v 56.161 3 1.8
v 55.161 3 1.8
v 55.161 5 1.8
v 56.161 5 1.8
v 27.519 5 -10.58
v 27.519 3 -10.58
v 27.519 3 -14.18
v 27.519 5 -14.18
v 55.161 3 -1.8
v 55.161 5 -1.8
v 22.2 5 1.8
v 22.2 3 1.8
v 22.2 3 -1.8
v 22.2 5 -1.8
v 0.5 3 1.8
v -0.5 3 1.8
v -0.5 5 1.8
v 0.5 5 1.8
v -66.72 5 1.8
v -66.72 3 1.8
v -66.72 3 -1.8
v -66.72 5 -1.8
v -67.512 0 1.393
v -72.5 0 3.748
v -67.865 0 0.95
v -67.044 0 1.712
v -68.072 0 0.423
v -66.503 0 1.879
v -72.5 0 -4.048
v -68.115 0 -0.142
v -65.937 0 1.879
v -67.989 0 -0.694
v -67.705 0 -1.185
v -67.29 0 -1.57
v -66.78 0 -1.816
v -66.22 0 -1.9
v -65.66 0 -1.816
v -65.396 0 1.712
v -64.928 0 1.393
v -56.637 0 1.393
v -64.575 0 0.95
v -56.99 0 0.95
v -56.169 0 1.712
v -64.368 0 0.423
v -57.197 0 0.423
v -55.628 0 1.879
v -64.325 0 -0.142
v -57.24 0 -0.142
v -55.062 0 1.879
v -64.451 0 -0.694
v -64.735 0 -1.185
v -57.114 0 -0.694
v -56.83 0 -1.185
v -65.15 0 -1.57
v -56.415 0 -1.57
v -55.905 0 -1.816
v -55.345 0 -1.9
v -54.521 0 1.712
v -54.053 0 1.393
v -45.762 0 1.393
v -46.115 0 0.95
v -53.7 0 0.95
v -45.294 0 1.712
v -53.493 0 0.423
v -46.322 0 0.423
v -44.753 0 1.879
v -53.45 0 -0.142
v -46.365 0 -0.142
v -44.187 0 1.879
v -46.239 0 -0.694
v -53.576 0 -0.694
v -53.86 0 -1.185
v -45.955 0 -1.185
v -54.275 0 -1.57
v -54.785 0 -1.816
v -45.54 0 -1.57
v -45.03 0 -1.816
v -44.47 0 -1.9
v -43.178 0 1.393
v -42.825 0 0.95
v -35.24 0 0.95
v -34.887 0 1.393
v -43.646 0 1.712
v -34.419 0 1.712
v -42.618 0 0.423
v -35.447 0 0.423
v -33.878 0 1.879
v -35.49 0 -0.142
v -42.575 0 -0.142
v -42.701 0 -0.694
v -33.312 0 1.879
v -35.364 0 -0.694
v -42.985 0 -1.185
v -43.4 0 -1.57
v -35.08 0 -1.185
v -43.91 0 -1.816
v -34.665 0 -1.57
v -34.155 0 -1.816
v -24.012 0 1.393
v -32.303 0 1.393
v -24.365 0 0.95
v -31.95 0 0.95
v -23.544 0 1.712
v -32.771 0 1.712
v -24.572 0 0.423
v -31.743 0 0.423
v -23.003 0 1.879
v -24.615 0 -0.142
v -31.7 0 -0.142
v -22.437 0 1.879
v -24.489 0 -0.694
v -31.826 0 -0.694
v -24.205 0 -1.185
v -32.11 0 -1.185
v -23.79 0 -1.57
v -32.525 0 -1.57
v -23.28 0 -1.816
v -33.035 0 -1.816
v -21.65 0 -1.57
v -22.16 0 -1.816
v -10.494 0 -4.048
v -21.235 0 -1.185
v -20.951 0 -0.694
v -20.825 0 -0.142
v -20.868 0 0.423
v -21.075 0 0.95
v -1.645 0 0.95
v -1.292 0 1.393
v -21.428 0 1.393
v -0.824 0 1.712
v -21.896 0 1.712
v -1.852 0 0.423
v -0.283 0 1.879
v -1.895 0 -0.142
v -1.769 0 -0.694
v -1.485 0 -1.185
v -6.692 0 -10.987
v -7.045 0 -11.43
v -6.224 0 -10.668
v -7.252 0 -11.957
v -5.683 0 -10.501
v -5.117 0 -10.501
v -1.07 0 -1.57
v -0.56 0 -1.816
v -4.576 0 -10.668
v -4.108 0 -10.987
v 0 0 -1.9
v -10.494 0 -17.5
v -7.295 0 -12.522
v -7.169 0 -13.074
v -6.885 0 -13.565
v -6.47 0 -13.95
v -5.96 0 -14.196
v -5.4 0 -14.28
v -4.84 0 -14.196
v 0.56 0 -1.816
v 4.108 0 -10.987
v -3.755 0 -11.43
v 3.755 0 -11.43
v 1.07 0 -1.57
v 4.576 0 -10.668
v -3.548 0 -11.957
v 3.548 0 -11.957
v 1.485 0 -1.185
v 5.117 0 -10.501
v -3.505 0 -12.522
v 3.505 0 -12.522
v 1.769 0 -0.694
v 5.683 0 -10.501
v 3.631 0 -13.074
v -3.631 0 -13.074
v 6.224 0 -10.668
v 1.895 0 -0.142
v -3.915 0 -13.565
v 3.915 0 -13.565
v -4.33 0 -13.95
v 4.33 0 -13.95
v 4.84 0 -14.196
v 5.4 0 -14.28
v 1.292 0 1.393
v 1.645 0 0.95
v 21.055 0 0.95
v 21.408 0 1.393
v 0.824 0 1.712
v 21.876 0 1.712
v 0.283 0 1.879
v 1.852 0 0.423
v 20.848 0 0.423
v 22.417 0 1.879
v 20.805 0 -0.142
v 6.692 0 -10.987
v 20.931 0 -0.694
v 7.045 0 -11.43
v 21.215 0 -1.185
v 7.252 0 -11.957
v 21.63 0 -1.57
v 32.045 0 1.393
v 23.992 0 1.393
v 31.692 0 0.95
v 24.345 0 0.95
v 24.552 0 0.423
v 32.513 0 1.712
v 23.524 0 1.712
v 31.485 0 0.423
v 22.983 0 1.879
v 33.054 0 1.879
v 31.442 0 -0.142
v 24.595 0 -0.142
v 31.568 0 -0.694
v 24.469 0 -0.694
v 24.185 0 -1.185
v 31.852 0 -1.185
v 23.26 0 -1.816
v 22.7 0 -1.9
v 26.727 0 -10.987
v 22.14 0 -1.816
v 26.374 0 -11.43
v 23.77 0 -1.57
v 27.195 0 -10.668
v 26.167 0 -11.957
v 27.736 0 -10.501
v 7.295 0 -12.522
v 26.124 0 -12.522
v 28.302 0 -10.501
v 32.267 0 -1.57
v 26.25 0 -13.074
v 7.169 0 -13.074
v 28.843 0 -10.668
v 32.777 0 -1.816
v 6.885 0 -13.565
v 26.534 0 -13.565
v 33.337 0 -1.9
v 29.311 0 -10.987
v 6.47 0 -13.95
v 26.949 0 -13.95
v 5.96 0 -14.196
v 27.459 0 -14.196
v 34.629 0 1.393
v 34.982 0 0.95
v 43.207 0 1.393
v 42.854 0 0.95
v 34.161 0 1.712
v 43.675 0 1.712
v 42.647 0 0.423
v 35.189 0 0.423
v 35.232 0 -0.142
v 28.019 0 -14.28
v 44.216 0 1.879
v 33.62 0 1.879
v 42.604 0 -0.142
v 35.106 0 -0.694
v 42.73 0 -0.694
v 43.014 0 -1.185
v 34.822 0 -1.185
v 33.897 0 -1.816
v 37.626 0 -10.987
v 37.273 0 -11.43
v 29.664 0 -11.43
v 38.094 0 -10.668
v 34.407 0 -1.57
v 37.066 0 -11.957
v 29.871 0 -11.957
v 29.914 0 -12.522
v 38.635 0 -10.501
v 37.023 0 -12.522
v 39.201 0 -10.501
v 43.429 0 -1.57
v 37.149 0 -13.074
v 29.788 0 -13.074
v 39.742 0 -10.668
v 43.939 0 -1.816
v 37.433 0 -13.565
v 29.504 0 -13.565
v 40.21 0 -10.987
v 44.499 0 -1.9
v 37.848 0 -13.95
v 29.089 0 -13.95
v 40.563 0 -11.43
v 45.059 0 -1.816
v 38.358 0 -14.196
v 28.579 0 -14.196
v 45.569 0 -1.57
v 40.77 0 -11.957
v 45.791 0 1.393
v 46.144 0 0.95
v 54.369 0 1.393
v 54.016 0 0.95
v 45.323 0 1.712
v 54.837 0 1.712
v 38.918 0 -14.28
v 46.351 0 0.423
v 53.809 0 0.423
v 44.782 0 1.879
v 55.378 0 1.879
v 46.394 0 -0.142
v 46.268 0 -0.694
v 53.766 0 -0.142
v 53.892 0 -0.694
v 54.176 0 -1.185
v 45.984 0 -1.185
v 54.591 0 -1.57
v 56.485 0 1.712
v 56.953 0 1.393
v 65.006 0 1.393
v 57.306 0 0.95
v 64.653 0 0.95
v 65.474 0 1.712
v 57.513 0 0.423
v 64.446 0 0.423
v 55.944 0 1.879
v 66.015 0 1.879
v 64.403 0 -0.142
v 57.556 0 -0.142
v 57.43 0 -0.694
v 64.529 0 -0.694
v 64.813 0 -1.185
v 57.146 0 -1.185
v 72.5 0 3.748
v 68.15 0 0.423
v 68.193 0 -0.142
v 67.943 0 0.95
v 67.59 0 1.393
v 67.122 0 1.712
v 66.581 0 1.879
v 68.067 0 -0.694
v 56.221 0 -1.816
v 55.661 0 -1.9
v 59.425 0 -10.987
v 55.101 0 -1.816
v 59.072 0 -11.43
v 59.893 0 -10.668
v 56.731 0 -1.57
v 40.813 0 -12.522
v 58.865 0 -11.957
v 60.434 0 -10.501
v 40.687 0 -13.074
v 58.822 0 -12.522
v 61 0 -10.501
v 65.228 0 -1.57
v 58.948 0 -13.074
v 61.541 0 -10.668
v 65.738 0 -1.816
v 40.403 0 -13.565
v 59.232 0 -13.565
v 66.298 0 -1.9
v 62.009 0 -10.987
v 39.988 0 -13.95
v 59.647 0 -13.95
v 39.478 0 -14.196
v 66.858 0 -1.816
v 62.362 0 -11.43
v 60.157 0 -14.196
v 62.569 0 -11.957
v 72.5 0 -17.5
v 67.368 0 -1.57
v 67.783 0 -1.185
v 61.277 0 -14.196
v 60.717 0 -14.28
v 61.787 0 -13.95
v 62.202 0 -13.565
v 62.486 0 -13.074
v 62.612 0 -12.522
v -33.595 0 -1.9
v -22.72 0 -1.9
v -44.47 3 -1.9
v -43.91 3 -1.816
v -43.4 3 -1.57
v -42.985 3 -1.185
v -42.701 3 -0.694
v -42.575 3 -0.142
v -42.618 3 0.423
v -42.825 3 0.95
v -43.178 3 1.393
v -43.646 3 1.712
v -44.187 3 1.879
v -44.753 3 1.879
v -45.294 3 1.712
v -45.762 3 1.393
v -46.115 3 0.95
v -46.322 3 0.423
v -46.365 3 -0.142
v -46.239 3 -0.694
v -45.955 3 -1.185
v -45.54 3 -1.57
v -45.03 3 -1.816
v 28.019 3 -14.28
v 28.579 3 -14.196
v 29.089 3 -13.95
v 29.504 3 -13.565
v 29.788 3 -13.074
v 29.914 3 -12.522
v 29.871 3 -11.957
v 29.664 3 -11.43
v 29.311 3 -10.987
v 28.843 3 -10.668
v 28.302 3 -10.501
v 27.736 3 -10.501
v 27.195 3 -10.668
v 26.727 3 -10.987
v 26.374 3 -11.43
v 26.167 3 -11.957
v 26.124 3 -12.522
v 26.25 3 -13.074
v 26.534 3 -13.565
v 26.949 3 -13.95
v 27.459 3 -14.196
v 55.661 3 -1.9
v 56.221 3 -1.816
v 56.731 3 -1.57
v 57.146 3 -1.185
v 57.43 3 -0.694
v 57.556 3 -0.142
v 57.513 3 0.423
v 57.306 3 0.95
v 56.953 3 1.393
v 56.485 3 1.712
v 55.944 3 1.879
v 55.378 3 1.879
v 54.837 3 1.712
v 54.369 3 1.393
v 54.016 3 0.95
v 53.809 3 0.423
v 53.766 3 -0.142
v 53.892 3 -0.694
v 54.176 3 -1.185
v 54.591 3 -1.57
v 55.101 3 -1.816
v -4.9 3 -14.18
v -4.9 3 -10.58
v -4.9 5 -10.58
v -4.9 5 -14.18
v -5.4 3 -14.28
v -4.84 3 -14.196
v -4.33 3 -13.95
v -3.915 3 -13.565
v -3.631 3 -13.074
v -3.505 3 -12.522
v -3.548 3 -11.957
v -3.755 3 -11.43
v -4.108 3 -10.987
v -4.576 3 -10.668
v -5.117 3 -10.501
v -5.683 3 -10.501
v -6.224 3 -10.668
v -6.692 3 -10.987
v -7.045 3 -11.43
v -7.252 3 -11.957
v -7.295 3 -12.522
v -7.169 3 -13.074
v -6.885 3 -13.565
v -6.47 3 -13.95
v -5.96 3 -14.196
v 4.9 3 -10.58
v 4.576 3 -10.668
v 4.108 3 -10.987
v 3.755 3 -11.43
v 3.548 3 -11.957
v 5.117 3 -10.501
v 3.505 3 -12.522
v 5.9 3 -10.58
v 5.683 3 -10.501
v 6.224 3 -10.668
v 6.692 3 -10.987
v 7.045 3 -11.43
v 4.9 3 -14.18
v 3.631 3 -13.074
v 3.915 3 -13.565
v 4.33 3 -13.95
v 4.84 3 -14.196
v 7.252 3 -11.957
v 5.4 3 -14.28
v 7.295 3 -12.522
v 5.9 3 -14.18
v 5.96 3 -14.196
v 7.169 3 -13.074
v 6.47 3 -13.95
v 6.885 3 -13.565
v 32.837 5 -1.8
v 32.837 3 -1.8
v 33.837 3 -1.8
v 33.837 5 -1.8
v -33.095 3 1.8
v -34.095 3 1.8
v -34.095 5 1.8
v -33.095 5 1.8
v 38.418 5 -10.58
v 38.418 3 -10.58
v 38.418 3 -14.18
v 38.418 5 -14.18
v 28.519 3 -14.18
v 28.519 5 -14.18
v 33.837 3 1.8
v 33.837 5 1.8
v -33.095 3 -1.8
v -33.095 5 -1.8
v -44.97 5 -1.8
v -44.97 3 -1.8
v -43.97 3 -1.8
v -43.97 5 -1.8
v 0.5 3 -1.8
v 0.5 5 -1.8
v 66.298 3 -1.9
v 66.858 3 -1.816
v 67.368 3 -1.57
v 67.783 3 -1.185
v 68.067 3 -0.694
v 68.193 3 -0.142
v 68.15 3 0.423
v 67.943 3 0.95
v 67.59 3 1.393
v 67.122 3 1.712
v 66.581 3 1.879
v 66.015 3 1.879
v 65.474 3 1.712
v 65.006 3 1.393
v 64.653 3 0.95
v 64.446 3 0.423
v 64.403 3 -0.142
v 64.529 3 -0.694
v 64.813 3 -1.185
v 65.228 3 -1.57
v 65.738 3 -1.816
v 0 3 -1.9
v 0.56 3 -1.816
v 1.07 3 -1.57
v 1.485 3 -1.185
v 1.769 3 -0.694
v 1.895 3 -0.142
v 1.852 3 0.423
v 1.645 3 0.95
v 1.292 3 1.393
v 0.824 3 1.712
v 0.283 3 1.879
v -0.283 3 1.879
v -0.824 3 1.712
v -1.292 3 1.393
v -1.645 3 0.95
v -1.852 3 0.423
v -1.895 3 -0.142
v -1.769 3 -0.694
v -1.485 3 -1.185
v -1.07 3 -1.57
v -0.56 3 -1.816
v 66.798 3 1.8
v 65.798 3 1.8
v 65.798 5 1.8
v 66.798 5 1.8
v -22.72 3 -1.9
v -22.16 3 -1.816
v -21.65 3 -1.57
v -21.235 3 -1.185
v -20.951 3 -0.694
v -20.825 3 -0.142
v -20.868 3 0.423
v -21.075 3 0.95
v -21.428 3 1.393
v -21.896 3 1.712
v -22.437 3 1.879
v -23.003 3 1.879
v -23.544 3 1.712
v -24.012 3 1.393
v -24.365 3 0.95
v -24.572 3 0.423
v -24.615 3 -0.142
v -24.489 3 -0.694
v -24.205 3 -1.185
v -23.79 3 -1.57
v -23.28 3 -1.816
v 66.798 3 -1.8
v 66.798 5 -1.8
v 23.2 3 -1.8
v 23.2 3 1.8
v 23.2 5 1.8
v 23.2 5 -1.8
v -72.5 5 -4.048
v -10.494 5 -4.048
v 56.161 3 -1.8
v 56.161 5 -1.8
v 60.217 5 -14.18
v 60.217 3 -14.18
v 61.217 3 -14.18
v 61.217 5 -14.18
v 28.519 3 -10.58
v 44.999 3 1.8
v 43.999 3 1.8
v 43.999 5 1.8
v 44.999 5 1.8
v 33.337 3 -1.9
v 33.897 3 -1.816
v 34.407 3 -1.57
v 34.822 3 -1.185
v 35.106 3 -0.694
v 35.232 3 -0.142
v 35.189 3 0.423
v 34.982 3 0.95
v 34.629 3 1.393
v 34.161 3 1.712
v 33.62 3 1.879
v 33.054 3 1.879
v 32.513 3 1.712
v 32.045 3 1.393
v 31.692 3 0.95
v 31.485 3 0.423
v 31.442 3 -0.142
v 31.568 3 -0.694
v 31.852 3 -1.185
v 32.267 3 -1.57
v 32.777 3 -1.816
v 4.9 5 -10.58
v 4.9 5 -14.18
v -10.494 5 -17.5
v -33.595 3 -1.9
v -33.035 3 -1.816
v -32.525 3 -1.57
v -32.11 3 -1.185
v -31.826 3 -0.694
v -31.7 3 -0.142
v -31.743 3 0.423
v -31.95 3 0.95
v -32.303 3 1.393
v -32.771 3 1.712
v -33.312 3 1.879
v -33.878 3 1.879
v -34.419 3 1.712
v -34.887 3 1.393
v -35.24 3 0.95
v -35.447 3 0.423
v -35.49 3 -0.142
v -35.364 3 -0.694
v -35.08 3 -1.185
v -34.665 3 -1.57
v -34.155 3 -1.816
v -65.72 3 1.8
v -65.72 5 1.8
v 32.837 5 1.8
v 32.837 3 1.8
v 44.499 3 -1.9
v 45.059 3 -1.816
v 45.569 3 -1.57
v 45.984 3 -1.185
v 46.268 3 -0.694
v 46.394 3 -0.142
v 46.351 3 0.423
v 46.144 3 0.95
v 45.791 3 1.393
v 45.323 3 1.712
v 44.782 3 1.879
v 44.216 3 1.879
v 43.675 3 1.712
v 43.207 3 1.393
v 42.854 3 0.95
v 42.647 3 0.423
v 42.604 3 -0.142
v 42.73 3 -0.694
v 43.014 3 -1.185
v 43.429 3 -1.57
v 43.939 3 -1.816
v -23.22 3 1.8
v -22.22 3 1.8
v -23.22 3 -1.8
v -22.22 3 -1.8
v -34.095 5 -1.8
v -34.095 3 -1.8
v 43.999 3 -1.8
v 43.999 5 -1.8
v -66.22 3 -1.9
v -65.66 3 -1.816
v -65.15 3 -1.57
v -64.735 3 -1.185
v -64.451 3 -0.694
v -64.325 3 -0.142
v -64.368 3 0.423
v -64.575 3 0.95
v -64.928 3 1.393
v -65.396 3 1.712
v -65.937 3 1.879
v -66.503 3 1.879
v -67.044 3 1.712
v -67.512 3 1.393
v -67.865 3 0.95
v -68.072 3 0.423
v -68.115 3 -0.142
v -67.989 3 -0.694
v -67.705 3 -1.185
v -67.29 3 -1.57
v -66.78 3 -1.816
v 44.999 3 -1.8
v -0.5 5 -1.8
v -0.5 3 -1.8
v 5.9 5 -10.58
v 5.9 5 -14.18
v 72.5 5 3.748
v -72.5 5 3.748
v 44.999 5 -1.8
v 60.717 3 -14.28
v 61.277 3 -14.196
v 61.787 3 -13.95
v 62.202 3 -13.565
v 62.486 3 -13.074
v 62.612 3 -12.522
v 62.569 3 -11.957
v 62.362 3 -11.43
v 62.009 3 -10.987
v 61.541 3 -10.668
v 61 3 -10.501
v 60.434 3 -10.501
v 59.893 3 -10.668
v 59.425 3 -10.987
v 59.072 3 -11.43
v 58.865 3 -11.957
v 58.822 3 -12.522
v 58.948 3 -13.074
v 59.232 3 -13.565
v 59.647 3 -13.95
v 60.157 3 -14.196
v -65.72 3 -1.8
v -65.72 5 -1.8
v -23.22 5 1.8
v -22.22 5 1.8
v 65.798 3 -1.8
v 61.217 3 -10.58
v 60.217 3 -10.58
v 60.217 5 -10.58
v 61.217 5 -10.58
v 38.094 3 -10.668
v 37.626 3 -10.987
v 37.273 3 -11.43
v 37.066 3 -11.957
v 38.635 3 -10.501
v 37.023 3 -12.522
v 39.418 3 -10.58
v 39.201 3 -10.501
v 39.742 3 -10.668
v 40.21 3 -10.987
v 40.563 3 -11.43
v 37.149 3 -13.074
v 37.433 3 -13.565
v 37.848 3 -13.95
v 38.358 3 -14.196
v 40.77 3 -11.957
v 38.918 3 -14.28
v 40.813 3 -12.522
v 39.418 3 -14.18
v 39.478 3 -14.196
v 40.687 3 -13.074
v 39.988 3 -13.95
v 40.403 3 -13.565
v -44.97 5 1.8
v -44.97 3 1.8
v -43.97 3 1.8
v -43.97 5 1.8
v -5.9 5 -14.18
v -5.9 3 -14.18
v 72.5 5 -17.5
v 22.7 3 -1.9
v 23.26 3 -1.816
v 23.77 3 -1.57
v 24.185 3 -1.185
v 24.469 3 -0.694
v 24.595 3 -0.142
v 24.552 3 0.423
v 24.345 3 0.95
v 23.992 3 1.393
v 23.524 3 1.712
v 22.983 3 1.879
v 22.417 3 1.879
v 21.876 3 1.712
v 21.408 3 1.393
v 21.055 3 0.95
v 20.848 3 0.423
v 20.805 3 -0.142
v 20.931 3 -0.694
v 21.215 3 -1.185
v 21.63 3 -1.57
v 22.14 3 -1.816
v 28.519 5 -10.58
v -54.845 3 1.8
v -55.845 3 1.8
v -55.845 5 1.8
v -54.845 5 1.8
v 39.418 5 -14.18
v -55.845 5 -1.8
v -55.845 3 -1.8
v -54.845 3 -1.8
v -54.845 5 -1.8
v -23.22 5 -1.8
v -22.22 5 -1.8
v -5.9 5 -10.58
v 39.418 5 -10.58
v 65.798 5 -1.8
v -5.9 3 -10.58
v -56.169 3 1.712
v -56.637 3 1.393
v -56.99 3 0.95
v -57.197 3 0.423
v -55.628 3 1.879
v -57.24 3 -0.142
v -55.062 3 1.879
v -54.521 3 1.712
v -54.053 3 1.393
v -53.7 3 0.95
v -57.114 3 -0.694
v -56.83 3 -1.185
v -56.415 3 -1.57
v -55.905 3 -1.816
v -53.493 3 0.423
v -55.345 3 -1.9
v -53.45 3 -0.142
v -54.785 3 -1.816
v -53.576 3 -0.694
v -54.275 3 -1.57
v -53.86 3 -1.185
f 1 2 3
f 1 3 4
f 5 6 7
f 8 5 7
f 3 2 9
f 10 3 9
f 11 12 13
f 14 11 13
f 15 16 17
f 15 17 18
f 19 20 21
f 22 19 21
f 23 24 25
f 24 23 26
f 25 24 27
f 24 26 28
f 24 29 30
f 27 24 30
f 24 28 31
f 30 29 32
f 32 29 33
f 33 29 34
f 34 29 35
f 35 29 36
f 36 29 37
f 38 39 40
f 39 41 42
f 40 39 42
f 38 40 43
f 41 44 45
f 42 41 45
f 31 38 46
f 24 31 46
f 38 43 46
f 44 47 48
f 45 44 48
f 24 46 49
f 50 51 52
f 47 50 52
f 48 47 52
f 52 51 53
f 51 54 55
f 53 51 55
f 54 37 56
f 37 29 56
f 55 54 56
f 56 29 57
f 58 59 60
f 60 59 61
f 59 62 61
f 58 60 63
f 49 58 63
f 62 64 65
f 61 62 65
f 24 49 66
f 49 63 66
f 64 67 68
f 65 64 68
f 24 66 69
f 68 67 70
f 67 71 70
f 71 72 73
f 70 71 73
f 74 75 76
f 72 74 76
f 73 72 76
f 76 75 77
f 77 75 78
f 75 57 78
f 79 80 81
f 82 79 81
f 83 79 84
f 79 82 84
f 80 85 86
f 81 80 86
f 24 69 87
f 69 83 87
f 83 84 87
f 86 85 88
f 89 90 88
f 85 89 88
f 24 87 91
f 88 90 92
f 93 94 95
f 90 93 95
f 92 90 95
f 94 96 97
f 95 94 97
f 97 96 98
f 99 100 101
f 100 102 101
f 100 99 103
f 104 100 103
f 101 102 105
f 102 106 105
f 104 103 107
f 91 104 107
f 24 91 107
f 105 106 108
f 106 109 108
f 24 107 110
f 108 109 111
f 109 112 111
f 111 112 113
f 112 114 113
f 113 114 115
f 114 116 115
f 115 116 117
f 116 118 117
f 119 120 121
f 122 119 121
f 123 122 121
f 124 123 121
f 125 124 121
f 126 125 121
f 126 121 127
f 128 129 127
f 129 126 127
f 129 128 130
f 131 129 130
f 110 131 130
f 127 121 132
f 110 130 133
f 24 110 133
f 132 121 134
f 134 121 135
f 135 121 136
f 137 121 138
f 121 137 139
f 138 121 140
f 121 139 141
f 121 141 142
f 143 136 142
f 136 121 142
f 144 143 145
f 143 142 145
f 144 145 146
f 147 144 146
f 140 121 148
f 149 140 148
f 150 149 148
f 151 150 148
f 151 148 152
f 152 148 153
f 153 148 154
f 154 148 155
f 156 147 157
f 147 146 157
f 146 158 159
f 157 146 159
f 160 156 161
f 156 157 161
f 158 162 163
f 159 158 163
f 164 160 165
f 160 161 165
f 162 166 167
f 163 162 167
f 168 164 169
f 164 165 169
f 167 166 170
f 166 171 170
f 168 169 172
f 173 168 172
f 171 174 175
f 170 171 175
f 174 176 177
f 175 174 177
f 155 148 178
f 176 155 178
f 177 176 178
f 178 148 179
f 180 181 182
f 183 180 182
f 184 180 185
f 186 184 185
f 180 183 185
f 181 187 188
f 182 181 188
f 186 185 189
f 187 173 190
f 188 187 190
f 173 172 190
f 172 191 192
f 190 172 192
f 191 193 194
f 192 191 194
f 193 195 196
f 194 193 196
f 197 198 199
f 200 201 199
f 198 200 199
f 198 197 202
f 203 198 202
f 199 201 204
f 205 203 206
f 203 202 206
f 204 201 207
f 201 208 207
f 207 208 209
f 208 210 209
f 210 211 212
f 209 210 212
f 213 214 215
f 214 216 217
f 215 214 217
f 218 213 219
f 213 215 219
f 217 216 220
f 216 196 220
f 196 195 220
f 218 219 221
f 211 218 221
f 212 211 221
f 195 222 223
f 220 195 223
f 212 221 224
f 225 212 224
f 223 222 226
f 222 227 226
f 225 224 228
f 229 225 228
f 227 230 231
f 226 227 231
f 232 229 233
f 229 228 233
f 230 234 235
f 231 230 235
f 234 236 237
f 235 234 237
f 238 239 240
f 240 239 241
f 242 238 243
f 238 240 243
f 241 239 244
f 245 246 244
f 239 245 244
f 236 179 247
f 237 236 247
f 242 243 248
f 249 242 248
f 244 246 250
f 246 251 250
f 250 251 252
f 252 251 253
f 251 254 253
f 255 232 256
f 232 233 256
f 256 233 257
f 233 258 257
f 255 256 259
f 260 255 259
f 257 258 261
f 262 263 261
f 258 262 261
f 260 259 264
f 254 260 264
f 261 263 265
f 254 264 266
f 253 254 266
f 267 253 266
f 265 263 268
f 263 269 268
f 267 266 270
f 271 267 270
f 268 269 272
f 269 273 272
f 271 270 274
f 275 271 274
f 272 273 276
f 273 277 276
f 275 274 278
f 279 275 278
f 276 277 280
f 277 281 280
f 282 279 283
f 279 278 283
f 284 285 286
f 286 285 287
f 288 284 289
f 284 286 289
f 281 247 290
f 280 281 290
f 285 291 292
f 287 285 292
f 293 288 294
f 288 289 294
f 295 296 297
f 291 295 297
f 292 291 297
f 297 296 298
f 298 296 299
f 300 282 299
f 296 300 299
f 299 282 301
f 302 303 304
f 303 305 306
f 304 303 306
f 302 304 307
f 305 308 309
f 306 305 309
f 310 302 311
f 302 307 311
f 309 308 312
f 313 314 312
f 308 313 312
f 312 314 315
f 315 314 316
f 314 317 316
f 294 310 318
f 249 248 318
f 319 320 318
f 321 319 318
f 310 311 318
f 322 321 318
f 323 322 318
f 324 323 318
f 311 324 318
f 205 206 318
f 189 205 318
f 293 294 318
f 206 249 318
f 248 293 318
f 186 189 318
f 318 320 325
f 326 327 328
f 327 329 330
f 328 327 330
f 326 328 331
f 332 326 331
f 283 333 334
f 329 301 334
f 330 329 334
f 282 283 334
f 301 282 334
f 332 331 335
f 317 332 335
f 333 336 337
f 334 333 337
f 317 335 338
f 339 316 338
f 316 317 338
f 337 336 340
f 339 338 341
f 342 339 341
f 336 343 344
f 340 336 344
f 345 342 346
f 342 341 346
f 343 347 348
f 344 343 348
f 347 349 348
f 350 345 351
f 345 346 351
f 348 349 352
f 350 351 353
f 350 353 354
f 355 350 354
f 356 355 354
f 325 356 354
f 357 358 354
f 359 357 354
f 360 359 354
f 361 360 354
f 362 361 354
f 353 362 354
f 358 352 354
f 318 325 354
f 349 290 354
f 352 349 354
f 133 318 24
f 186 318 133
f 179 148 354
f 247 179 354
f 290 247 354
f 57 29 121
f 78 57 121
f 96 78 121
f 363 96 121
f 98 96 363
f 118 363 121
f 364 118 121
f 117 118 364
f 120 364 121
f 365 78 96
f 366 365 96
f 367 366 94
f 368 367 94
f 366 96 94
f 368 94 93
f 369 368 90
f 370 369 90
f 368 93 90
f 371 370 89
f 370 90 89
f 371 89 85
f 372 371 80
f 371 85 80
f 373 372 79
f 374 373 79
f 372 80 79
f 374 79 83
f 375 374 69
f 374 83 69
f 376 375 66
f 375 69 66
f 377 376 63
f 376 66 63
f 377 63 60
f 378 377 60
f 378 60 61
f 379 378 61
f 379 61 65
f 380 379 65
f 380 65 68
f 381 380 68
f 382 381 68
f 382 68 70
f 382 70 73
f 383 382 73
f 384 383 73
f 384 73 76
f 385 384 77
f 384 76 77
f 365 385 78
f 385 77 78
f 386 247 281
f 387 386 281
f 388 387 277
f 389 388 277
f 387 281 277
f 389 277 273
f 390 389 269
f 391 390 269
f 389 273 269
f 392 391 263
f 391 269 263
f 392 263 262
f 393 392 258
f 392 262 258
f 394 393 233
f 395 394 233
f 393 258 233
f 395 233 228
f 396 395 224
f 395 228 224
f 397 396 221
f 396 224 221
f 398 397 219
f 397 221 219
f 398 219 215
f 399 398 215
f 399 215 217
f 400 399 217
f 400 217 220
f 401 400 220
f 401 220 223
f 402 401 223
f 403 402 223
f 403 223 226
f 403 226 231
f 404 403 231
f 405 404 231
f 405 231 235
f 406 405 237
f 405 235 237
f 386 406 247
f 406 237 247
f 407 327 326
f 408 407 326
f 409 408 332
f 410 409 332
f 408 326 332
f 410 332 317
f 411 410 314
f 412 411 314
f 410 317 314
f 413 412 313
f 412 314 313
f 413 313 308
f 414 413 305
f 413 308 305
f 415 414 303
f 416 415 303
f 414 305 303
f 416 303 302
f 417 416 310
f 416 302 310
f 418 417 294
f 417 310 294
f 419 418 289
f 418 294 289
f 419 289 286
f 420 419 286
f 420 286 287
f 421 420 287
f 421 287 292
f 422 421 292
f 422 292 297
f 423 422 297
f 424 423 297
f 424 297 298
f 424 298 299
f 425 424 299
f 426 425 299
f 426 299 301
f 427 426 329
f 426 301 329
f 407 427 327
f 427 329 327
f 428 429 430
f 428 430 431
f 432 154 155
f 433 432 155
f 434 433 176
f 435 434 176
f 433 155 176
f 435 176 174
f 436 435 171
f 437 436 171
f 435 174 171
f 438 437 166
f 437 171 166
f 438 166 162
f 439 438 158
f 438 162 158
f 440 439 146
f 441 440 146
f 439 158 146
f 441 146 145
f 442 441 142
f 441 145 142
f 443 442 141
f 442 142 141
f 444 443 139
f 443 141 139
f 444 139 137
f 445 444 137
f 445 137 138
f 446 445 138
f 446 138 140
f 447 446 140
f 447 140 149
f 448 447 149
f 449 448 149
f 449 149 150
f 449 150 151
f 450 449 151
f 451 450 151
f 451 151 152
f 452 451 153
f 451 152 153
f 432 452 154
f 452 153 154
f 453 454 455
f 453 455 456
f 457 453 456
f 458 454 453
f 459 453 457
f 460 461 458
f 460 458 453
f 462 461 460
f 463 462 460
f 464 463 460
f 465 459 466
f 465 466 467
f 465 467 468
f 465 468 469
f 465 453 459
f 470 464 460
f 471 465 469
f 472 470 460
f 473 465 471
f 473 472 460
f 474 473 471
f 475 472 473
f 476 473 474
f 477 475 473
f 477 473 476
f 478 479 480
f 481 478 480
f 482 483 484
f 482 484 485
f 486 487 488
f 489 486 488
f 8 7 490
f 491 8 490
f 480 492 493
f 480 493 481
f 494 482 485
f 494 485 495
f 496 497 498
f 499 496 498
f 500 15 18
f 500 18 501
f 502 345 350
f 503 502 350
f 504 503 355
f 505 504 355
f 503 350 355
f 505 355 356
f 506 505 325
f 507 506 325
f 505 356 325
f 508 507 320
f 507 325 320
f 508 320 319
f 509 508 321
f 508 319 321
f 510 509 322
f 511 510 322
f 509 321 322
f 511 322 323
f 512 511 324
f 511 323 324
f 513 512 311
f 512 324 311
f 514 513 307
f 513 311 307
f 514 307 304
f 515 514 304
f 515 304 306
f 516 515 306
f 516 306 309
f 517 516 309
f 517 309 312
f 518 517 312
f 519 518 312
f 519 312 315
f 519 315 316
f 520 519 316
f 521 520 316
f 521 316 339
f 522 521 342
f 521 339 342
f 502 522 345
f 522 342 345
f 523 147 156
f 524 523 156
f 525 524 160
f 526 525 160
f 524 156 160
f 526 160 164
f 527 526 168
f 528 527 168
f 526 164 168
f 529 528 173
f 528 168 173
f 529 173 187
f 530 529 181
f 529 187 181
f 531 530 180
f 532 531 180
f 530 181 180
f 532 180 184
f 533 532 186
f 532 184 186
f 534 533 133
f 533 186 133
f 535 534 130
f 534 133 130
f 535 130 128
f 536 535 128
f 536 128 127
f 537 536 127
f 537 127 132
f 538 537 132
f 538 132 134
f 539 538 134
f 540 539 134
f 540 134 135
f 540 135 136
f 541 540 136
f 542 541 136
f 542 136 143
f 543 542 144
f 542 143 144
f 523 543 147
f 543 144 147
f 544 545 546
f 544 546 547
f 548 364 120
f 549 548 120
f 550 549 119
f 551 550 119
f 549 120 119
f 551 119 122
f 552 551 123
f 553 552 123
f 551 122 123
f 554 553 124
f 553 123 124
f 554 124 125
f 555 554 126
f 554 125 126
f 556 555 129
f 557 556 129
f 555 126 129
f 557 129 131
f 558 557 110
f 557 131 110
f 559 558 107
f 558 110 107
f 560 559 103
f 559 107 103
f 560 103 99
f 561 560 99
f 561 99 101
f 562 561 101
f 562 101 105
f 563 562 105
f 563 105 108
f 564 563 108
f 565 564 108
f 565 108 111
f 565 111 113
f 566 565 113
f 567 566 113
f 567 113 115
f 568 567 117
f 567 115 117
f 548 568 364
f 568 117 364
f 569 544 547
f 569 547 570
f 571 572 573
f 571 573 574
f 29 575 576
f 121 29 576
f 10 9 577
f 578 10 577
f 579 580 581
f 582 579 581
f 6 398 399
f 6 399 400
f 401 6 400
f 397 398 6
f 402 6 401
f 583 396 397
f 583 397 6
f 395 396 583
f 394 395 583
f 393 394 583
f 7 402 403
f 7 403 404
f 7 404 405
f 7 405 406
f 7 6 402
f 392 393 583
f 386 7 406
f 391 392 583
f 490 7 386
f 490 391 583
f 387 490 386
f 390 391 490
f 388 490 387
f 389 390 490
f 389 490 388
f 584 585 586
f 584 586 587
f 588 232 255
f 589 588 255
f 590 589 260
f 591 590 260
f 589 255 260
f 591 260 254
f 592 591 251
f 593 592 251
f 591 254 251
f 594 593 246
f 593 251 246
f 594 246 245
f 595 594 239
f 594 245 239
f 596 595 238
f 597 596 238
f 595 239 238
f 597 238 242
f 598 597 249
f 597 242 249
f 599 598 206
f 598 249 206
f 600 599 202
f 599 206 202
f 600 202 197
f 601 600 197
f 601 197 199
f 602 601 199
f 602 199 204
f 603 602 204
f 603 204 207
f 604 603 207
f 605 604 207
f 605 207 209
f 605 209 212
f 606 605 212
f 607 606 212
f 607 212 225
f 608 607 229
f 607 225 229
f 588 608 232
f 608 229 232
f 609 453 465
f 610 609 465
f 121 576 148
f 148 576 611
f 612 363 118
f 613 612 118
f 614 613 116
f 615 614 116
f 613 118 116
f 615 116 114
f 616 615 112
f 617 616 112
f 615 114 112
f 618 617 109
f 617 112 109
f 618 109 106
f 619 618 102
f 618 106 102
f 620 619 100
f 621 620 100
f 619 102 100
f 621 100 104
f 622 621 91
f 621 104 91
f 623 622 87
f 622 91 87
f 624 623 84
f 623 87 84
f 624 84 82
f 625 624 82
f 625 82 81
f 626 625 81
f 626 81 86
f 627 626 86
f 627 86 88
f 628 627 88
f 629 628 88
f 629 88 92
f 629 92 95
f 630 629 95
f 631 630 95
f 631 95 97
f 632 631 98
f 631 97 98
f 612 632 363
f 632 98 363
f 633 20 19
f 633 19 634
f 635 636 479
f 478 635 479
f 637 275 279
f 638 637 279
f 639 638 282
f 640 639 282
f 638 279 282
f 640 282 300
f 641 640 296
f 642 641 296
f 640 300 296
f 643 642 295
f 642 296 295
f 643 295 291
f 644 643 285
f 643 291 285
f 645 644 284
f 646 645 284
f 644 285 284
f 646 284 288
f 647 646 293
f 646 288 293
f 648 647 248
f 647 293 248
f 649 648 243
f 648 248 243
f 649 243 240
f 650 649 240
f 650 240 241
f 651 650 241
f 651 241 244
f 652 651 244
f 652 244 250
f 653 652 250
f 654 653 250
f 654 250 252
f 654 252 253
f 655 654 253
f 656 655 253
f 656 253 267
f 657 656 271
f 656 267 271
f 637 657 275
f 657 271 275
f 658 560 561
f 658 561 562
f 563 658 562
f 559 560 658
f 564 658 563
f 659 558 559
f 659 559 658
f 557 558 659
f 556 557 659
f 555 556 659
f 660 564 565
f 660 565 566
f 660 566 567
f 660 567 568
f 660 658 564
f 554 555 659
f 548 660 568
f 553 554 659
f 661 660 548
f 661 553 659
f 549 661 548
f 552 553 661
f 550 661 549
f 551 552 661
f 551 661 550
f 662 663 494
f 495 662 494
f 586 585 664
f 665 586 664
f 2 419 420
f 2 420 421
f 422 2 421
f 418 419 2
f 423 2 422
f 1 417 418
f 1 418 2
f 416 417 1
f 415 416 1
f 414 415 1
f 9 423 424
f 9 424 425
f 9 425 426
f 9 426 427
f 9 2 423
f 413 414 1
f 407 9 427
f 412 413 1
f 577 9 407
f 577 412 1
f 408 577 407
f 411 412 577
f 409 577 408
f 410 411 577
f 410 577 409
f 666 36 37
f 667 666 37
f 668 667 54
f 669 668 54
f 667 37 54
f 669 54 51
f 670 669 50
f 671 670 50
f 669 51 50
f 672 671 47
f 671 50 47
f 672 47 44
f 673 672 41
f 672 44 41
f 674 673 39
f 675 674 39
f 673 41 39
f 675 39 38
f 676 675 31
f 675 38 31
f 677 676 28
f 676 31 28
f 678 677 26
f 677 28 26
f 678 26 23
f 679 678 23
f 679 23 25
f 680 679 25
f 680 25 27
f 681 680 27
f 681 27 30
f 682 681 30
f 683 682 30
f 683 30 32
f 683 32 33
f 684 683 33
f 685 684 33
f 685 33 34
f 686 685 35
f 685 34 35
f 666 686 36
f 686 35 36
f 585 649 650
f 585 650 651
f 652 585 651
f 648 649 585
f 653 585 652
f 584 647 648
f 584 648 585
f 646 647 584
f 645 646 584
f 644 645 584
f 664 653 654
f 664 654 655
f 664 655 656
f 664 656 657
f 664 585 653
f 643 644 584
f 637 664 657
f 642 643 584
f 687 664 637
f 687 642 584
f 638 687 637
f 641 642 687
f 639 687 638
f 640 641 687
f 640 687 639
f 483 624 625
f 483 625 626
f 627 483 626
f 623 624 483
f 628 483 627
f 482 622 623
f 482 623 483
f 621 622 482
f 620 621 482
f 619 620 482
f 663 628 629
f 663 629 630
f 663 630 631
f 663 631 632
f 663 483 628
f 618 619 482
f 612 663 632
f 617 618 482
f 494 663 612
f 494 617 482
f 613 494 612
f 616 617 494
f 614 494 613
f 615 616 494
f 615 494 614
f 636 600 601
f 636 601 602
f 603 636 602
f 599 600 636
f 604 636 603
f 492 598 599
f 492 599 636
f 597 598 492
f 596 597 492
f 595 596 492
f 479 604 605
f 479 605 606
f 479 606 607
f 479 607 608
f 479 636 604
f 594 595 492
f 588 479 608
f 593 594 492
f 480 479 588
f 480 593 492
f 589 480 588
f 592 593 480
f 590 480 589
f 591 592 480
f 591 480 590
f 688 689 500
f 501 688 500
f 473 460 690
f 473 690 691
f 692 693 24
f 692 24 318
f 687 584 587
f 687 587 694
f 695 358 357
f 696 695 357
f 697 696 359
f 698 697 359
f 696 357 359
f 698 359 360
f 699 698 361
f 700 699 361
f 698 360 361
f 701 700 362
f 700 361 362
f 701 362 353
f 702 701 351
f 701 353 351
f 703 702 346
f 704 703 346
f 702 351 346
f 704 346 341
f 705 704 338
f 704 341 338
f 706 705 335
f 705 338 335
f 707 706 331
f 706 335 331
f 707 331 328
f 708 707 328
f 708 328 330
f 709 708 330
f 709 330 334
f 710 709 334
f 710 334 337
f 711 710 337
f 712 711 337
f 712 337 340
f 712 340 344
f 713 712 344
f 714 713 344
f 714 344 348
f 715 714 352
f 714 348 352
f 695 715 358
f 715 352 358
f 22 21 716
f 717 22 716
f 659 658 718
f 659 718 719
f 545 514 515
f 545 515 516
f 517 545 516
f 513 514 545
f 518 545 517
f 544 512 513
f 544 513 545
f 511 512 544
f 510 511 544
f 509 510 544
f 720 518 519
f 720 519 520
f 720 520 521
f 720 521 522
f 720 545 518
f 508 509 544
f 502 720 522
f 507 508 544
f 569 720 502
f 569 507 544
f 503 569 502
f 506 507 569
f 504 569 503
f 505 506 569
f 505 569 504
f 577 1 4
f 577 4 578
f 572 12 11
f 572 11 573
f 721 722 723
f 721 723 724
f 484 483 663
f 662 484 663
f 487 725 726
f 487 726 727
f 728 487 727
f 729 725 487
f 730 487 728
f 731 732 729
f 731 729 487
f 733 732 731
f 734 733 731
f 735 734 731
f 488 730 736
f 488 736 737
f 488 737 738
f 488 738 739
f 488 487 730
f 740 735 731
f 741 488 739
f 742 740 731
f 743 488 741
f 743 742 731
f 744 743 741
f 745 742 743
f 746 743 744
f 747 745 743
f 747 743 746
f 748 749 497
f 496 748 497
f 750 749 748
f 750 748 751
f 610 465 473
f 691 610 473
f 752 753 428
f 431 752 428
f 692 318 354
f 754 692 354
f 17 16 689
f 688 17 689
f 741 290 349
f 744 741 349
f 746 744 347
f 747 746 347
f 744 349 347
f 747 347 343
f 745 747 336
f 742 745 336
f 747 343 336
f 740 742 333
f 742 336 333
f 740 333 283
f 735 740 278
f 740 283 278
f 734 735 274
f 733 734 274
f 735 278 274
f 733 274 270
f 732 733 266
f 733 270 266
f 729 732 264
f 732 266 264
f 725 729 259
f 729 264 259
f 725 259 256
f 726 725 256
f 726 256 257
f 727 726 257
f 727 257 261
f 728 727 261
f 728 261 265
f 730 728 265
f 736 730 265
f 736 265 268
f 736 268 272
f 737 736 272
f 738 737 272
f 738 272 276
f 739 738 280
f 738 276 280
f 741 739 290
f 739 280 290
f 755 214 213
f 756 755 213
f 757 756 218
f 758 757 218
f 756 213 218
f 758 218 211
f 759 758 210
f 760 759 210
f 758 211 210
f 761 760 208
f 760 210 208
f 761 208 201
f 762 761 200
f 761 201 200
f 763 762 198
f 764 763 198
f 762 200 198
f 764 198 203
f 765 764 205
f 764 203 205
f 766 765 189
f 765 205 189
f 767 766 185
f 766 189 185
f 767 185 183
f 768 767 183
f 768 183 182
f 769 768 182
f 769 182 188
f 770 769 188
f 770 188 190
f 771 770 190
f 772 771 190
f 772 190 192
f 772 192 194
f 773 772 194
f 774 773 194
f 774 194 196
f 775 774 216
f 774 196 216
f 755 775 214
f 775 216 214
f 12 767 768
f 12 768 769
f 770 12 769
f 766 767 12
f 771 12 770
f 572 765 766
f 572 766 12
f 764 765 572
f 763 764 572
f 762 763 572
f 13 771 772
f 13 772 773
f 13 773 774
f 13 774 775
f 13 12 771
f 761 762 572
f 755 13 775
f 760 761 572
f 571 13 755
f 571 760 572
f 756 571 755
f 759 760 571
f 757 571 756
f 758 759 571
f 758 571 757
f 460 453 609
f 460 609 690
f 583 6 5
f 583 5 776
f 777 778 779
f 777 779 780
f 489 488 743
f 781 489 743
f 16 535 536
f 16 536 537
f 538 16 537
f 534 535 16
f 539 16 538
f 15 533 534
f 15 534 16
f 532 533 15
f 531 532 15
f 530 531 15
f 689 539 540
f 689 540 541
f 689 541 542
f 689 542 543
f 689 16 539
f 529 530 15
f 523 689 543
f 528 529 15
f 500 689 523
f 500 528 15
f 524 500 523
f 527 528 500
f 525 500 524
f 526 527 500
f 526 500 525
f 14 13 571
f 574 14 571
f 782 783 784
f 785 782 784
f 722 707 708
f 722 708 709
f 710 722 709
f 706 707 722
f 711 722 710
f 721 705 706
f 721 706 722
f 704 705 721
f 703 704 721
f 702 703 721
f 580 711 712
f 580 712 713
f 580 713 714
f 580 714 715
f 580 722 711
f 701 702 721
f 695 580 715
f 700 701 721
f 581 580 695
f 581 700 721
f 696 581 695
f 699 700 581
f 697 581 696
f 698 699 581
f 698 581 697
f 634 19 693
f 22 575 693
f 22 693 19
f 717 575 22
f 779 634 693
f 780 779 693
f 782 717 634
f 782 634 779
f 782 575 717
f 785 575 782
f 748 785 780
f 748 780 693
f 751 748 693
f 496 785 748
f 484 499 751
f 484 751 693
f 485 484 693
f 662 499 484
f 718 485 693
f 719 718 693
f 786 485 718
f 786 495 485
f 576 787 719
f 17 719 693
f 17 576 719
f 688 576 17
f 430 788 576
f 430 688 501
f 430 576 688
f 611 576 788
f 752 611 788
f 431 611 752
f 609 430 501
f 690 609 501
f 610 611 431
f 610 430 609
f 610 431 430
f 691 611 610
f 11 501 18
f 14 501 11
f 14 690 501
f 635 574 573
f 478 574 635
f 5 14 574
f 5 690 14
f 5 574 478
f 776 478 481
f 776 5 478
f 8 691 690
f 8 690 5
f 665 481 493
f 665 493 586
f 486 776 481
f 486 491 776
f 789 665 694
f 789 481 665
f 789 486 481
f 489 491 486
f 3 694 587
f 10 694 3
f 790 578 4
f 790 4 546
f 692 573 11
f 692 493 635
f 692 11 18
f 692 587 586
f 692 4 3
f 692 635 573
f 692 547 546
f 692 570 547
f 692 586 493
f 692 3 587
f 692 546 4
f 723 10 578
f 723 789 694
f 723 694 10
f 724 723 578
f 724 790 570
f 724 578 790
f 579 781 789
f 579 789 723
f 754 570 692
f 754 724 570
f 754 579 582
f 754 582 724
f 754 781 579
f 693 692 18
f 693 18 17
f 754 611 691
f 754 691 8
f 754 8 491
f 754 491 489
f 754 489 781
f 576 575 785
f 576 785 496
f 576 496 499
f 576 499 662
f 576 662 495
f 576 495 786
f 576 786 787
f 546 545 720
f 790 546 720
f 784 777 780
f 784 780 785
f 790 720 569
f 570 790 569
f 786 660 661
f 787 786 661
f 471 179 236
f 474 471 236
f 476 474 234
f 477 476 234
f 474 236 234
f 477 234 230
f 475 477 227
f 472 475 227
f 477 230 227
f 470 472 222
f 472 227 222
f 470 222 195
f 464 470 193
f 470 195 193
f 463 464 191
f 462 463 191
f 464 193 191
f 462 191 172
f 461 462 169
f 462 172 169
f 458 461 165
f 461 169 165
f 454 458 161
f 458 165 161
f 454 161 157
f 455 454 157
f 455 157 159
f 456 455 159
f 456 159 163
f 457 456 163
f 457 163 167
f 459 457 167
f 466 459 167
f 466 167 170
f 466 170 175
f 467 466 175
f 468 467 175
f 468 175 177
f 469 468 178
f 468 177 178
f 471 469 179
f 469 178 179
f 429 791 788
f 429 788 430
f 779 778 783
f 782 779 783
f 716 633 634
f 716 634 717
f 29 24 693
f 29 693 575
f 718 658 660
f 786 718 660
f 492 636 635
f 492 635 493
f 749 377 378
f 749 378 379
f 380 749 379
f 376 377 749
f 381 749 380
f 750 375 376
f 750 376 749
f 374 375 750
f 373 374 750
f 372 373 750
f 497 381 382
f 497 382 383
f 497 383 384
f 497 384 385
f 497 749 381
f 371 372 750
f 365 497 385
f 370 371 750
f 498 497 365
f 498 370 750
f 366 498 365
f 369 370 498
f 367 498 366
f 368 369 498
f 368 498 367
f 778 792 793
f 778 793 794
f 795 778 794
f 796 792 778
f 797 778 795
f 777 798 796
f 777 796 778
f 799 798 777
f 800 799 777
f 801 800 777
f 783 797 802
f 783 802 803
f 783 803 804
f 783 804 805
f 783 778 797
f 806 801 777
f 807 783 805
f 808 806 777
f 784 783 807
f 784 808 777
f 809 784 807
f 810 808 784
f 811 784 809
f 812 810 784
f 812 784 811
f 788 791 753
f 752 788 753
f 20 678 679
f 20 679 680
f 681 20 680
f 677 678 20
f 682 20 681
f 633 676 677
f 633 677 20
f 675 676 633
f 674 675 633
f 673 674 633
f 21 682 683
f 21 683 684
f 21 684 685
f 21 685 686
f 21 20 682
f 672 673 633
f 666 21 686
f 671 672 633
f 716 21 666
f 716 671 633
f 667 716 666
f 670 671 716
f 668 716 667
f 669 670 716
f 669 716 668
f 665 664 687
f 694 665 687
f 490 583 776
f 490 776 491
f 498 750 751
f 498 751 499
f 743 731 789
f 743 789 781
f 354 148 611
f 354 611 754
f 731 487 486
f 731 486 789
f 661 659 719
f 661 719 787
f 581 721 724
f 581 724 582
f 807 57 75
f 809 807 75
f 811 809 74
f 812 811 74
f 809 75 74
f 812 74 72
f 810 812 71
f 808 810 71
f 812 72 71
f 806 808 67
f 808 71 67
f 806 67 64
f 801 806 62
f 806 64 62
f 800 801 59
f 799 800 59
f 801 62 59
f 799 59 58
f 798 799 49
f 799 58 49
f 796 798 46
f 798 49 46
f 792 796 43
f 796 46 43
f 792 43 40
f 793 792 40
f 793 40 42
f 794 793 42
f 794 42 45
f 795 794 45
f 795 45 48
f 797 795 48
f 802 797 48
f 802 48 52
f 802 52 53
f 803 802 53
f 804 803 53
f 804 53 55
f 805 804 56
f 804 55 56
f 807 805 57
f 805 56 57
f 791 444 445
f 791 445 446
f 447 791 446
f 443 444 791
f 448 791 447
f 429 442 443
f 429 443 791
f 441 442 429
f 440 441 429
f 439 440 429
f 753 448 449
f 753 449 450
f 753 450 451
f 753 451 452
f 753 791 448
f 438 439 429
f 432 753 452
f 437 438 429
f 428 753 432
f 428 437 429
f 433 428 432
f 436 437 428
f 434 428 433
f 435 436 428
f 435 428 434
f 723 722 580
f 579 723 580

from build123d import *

# Parameters (mm, degrees)
SKETCH1_W           = 145
SKETCH1_H           = 35
SKETCH1_W_2         = 1
SKETCH1_H_2         = 3.6
BOSS_EXTRUDE1_DEPTH = 5
CUT_EXTRUDE1_REACH  = 76.75
SKETCH2_W           = 145
SKETCH2_H           = 13.752262189
SKETCH2_W_2         = 62.00633413
SKETCH2_H_2         = 13.452443164
SKETCH4_R           = 1.9
CUT_EXTRUDE2_DEPTH  = 3


with BuildPart() as part:
    # Sketch1 → Boss-Extrude1 (new body)
    with BuildSketch(Plane(origin=(0, 0, 0), x_dir=(1, 0, 0), z_dir=(0, 1, 0))):
        Rectangle(SKETCH1_W, SKETCH1_H)
        Rectangle(SKETCH1_W_2, SKETCH1_H_2, mode=Mode.SUBTRACT)
        with Locations((-22.72, 0)):
            Rectangle(SKETCH1_W_2, SKETCH1_H_2, mode=Mode.SUBTRACT)
        with Locations((-33.595, 0)):
            Rectangle(SKETCH1_W_2, SKETCH1_H_2, mode=Mode.SUBTRACT)
        with Locations((-44.47, 0)):
            Rectangle(SKETCH1_W_2, SKETCH1_H_2, mode=Mode.SUBTRACT)
        with Locations((-55.345, 0)):
            Rectangle(SKETCH1_W_2, SKETCH1_H_2, mode=Mode.SUBTRACT)
        with Locations((-66.22, 0)):
            Rectangle(SKETCH1_W_2, SKETCH1_H_2, mode=Mode.SUBTRACT)
        with Locations((22.7, 0)):
            Rectangle(SKETCH1_W_2, SKETCH1_H_2, mode=Mode.SUBTRACT)
        with Locations((33.337, 0)):
            Rectangle(SKETCH1_W_2, SKETCH1_H_2, mode=Mode.SUBTRACT)
        with Locations((44.499, 0)):
            Rectangle(SKETCH1_W_2, SKETCH1_H_2, mode=Mode.SUBTRACT)
        with Locations((55.661, 0)):
            Rectangle(SKETCH1_W_2, SKETCH1_H_2, mode=Mode.SUBTRACT)
        with Locations((66.298, 0)):
            Rectangle(SKETCH1_W_2, SKETCH1_H_2, mode=Mode.SUBTRACT)
        with Locations((-5.4, 12.38)):
            Rectangle(SKETCH1_W_2, SKETCH1_H_2, mode=Mode.SUBTRACT)
        with Locations((5.4, 12.38)):
            Rectangle(SKETCH1_W_2, SKETCH1_H_2, mode=Mode.SUBTRACT)
        with Locations((28.019, 12.38)):
            Rectangle(SKETCH1_W_2, SKETCH1_H_2, mode=Mode.SUBTRACT)
        with Locations((38.918, 12.38)):
            Rectangle(SKETCH1_W_2, SKETCH1_H_2, mode=Mode.SUBTRACT)
        with Locations((60.717, 12.38)):
            Rectangle(SKETCH1_W_2, SKETCH1_H_2, mode=Mode.SUBTRACT)
    extrude(amount=BOSS_EXTRUDE1_DEPTH)

    # Sketch2 → Cut-Extrude1 (cut, up to next)
    with BuildSketch(Plane(origin=(0, 5, 0), x_dir=(1, 0, 0), z_dir=(0, 1, 0)), mode=Mode.PRIVATE) as cut_extrude1_sk1:
        with Locations((0, -10.623868906)):
            Rectangle(SKETCH2_W, SKETCH2_H)
    cut_extrude1_tool1 = extrude(cut_extrude1_sk1.sketch, amount=-CUT_EXTRUDE1_REACH, mode=Mode.PRIVATE) & part.part
    # Sketch2 → Cut-Extrude1 (cut, up to next)
    with BuildSketch(Plane(origin=(0, 5, 0), x_dir=(1, 0, 0), z_dir=(0, 1, 0)), mode=Mode.PRIVATE) as cut_extrude1_sk2:
        with Locations((-41.496832935, 10.773778418)):
            Rectangle(SKETCH2_W_2, SKETCH2_H_2)
    cut_extrude1_tool2 = extrude(cut_extrude1_sk2.sketch, amount=-CUT_EXTRUDE1_REACH, mode=Mode.PRIVATE) & part.part
    add(cut_extrude1_tool1.solids().sort_by_distance((0, 5, 10.623869))[0], mode=Mode.SUBTRACT)
    add(cut_extrude1_tool2.solids().sort_by_distance((-41.496833, 5, -10.773778))[0], mode=Mode.SUBTRACT)

    # Sketch4 → Cut-Extrude2 (cut)
    with BuildSketch(Plane.XZ):
        with Locations(Location((0, 0, 0), (0, 0, 270))):
            Circle(SKETCH4_R)
        with Locations(Location((-5.4, -12.38, 0), (0, 0, 270))):
            Circle(SKETCH4_R)
        with Locations(Location((-22.72, 0, 0), (0, 0, 270))):
            Circle(SKETCH4_R)
        with Locations(Location((-33.595, 0, 0), (0, 0, 270))):
            Circle(SKETCH4_R)
        with Locations(Location((-44.47, 0, 0), (0, 0, 270))):
            Circle(SKETCH4_R)
        with Locations(Location((-55.345, 0, 0), (0, 0, 270))):
            Circle(SKETCH4_R)
        with Locations(Location((-66.22, 0, 0), (0, 0, 270))):
            Circle(SKETCH4_R)
        with Locations(Location((5.4, -12.38, 0), (0, 0, 270))):
            Circle(SKETCH4_R)
        with Locations(Location((22.7, 0, 0), (0, 0, 270))):
            Circle(SKETCH4_R)
        with Locations(Location((33.337, 0, 0), (0, 0, 270))):
            Circle(SKETCH4_R)
        with Locations(Location((44.499, 0, 0), (0, 0, 270))):
            Circle(SKETCH4_R)
        with Locations(Location((55.661, 0, 0), (0, 0, 270))):
            Circle(SKETCH4_R)
        with Locations(Location((66.298, 0, 0), (0, 0, 270))):
            Circle(SKETCH4_R)
        with Locations(Location((28.019, -12.38, 0), (0, 0, 270))):
            Circle(SKETCH4_R)
        with Locations(Location((38.918, -12.38, 0), (0, 0, 270))):
            Circle(SKETCH4_R)
        with Locations(Location((60.717, -12.38, 0), (0, 0, 270))):
            Circle(SKETCH4_R)
    extrude(amount=-CUT_EXTRUDE2_DEPTH, mode=Mode.SUBTRACT)


solid = part.part
